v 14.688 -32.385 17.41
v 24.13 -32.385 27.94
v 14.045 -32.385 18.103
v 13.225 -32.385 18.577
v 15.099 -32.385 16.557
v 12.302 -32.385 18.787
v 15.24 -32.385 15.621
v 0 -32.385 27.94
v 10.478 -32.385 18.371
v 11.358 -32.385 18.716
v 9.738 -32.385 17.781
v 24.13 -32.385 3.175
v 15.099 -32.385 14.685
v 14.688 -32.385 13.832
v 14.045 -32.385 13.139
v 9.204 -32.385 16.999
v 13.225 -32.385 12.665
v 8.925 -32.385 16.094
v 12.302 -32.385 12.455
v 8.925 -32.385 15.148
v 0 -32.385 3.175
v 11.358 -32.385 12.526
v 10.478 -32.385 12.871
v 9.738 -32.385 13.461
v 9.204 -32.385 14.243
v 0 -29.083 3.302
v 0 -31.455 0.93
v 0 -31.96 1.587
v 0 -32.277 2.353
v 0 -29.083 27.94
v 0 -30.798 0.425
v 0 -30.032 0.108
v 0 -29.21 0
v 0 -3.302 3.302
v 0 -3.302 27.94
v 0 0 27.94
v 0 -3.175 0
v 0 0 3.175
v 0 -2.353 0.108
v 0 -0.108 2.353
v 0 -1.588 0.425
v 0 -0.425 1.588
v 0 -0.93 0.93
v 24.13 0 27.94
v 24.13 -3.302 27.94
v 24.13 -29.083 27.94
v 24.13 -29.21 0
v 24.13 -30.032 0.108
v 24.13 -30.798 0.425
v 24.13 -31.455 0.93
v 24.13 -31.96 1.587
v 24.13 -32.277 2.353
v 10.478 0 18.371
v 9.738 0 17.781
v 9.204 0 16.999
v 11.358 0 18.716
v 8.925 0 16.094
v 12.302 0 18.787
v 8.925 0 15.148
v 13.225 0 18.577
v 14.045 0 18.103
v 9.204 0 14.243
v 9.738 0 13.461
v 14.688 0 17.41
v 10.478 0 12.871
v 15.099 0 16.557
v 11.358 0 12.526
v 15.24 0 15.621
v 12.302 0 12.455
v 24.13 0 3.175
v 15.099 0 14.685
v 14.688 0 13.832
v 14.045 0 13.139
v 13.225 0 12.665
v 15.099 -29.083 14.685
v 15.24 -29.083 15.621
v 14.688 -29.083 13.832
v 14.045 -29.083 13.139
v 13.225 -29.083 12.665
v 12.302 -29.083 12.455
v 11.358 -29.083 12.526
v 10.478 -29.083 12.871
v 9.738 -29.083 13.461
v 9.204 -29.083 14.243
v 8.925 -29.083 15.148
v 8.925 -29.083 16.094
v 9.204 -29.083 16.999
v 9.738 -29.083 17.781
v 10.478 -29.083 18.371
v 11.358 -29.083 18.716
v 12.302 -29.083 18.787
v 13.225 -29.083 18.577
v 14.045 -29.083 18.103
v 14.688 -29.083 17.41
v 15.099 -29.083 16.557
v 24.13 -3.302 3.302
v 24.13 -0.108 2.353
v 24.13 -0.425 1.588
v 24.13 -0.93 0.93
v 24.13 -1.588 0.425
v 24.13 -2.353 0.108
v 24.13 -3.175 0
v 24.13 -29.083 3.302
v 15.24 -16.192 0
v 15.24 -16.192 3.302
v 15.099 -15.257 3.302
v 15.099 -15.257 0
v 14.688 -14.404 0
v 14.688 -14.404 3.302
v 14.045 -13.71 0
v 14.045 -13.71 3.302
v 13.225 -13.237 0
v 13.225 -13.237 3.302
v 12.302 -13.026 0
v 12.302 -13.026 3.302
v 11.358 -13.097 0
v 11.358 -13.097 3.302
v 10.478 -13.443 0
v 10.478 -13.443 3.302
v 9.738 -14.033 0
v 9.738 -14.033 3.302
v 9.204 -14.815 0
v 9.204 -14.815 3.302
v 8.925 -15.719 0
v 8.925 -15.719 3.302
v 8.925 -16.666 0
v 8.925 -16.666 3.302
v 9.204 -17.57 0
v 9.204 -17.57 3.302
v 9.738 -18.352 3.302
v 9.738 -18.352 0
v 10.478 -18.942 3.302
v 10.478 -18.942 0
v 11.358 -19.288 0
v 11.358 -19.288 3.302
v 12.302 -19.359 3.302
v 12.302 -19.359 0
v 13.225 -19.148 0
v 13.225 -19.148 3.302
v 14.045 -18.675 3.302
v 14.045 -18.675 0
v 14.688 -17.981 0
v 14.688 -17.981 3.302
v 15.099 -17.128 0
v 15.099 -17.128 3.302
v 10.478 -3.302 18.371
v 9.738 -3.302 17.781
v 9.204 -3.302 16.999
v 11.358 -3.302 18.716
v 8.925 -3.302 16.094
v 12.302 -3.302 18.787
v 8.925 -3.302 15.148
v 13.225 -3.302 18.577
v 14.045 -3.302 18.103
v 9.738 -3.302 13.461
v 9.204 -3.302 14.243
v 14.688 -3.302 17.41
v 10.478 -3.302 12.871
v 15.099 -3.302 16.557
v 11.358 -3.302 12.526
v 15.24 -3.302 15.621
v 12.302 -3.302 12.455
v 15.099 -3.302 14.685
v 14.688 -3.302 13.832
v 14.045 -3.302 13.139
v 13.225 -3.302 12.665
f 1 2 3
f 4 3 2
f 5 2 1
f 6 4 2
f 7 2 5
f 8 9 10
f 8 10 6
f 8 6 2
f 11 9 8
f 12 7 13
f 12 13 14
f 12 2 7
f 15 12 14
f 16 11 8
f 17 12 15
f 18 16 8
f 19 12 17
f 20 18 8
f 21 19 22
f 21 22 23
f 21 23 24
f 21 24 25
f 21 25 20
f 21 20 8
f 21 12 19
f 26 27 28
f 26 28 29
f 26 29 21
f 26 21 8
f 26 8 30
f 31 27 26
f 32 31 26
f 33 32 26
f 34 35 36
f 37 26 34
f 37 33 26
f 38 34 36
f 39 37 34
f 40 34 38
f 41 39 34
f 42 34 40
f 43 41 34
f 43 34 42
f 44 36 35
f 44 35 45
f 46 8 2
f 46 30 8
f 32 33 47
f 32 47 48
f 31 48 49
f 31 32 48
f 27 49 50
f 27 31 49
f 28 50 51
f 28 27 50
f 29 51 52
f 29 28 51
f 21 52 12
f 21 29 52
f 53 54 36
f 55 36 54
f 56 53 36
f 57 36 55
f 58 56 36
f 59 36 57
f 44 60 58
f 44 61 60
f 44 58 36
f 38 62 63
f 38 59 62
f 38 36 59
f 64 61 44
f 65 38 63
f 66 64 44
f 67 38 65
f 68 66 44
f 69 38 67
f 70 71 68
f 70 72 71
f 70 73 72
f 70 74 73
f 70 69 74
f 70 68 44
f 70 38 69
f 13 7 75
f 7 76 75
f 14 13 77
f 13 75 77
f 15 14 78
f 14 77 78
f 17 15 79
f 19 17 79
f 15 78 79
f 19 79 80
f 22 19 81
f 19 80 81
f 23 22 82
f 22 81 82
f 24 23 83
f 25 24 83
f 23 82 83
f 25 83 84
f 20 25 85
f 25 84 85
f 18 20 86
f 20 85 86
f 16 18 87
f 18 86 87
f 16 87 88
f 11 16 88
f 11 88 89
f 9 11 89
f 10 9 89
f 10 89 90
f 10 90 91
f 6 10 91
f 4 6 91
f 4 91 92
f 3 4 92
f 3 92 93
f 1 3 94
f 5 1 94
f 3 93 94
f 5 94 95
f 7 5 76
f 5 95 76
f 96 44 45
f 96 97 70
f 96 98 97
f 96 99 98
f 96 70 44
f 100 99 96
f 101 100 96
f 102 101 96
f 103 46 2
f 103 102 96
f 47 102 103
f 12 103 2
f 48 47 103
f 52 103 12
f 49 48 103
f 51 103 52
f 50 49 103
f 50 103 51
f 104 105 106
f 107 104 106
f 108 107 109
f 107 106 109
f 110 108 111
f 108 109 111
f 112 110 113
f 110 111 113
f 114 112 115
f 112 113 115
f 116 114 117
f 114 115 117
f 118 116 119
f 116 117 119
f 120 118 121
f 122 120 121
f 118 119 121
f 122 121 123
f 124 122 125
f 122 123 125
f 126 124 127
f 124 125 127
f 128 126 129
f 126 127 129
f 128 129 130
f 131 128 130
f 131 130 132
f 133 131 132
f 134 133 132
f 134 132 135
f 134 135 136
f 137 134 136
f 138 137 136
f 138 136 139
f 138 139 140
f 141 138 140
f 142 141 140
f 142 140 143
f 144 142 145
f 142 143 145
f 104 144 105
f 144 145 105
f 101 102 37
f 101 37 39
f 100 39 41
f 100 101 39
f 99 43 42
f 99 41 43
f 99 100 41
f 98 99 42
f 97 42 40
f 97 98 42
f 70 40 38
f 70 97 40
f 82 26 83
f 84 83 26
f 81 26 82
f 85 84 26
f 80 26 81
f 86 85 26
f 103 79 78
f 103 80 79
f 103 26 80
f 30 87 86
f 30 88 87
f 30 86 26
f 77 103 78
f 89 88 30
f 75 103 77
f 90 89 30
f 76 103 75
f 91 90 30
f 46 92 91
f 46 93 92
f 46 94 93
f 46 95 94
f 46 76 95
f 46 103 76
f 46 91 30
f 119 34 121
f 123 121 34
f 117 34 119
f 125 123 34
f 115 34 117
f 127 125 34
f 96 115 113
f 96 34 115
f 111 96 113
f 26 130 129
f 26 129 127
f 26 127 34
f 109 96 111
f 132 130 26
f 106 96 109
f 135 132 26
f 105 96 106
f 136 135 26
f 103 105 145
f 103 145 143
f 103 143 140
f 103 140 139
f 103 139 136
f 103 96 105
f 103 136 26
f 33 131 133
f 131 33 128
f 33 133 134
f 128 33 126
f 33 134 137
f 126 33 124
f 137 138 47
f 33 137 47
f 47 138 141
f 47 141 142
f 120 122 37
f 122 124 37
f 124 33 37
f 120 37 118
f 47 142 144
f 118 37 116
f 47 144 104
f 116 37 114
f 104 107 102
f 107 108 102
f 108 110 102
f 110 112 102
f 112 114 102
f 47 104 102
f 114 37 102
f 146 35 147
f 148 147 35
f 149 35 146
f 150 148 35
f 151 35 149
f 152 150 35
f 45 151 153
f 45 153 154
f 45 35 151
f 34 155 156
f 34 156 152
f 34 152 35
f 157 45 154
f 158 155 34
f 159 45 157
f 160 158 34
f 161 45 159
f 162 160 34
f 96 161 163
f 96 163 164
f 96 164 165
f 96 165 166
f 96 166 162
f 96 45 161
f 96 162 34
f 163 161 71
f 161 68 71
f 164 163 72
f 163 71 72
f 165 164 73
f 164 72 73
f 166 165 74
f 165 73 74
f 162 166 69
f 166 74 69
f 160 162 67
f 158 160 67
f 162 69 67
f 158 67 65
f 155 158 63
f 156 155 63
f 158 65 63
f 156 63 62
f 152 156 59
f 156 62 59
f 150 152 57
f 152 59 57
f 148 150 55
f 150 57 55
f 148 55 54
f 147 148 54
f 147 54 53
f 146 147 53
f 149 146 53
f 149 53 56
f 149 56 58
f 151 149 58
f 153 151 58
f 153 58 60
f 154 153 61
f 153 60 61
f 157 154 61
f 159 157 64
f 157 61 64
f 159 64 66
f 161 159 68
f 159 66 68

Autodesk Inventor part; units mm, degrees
ref_plane "YZ Plane" through (0, 0, 0) normal (1, 0, 0) x (0, 1, 0)
ref_plane "XZ Plane" through (0, 0, 0) normal (0, 1, 0) x (-1, 0, 0)
ref_plane "XY Plane" through (0, 0, 0) normal (0, 0, 1) x (1, 0, 0)
sketch "Sketch1" plane through (0, 0, 0) normal (0, 0, 1) x (1, 0, 0)
  line L0 (0, 0) -> (24.13, 0)
  line L1 (24.13, 0) -> (24.13, -32.385)
  line L2 (24.13, -32.385) -> (0, -32.385)
  line L3 (0, -32.385) -> (0, 0)
  dimension "d0" = 24.13
  dimension "d1" = 32.385
extrude "Extrusion1" add sketch "Sketch1" along normal blind 27.94
sketch "Sketch2" plane through (24.13, -32.385, 0) normal (1, 0, 0) x (0, 0, -1)
  line L0 (-27.94, 29.083) -> (-3.302, 29.083)
  line L1 (-3.302, 29.083) -> (-3.302, 3.302)
  line L2 (-3.302, 3.302) -> (-27.94, 3.302)
  line L3 (-27.94, 3.302) -> (-27.94, 29.083)
  line L4 (-27.94, 0) -> (-27.94, 32.385) projected
  line L5 (0, 0) -> (-27.94, 0) projected
  line L6 (0, 32.385) -> (0, 0) projected
  line L7 (0, 32.385) -> (-27.94, 32.385) projected
  dimension "d4" = 0
  dimension "d5" = 3.302
  dimension "d6" = 3.302
  dimension "d7" = 3.302
extrude "Extrusion2" cut sketch "Sketch2" against normal blind 34.925 contours L0 L1 L2 L3
sketch "Sketch3" plane through (24.13, -29.083, 3.302) normal (0, 0, 1) x (1, 0, 0)
  line L0 (-24.13, 0) -> (-24.13, 25.781) projected
  line L1 (0, 0) -> (-24.13, 0) projected
  line L2 (0, 25.781) -> (0, 0) projected
  line L3 (0, 25.781) -> (-24.13, 25.781) projected
  line L4 (-24.13, 25.781) -> (0, 25.781) projected
  line L5 (-12.065, 25.781) -> (-12.065, 0)
  line L6 (0, 0) -> (-24.13, 0) projected
  line L7 (-24.13, 0) -> (-24.13, 25.781) projected
  line L8 (-24.13, 12.8905) -> (0, 12.8905)
  circle A0 centre (-12.065, 12.8905) radius 3.175
  point P0 (-24.13, 29.083)
  dimension "d10" = 6.35
extrude "Extrusion3" cut sketch "Sketch3" against normal blind 34.925 contours A0 L5 L8 | L8 L5 A0 | L5 L8 A0 | L5 A0 L8
fillet "Fillet1" radius 3.175 2 edges at (12.065, 0, 0) (12.065, -32.385, 0)
sketch "Sketch4" plane through (0, 0, 27.94) normal (0, 1, 0) x (1, 0, 0)
  circle A0 centre (12.065, 12.319) radius 3.175
  line L0 (24.13, 24.765) -> (24.13, 0) projected
  line L1 (24.13, 0) -> (0, 0) projected
  point P0 (0, 27.94)
  dimension "d14" = 6.35
  dimension "d15" = 12.065
  dimension "d16" = 12.319
extrude "Extrusion4" cut sketch "Sketch4" against normal blind 34.925
properties part number "RobotArm CylinderPart2"
